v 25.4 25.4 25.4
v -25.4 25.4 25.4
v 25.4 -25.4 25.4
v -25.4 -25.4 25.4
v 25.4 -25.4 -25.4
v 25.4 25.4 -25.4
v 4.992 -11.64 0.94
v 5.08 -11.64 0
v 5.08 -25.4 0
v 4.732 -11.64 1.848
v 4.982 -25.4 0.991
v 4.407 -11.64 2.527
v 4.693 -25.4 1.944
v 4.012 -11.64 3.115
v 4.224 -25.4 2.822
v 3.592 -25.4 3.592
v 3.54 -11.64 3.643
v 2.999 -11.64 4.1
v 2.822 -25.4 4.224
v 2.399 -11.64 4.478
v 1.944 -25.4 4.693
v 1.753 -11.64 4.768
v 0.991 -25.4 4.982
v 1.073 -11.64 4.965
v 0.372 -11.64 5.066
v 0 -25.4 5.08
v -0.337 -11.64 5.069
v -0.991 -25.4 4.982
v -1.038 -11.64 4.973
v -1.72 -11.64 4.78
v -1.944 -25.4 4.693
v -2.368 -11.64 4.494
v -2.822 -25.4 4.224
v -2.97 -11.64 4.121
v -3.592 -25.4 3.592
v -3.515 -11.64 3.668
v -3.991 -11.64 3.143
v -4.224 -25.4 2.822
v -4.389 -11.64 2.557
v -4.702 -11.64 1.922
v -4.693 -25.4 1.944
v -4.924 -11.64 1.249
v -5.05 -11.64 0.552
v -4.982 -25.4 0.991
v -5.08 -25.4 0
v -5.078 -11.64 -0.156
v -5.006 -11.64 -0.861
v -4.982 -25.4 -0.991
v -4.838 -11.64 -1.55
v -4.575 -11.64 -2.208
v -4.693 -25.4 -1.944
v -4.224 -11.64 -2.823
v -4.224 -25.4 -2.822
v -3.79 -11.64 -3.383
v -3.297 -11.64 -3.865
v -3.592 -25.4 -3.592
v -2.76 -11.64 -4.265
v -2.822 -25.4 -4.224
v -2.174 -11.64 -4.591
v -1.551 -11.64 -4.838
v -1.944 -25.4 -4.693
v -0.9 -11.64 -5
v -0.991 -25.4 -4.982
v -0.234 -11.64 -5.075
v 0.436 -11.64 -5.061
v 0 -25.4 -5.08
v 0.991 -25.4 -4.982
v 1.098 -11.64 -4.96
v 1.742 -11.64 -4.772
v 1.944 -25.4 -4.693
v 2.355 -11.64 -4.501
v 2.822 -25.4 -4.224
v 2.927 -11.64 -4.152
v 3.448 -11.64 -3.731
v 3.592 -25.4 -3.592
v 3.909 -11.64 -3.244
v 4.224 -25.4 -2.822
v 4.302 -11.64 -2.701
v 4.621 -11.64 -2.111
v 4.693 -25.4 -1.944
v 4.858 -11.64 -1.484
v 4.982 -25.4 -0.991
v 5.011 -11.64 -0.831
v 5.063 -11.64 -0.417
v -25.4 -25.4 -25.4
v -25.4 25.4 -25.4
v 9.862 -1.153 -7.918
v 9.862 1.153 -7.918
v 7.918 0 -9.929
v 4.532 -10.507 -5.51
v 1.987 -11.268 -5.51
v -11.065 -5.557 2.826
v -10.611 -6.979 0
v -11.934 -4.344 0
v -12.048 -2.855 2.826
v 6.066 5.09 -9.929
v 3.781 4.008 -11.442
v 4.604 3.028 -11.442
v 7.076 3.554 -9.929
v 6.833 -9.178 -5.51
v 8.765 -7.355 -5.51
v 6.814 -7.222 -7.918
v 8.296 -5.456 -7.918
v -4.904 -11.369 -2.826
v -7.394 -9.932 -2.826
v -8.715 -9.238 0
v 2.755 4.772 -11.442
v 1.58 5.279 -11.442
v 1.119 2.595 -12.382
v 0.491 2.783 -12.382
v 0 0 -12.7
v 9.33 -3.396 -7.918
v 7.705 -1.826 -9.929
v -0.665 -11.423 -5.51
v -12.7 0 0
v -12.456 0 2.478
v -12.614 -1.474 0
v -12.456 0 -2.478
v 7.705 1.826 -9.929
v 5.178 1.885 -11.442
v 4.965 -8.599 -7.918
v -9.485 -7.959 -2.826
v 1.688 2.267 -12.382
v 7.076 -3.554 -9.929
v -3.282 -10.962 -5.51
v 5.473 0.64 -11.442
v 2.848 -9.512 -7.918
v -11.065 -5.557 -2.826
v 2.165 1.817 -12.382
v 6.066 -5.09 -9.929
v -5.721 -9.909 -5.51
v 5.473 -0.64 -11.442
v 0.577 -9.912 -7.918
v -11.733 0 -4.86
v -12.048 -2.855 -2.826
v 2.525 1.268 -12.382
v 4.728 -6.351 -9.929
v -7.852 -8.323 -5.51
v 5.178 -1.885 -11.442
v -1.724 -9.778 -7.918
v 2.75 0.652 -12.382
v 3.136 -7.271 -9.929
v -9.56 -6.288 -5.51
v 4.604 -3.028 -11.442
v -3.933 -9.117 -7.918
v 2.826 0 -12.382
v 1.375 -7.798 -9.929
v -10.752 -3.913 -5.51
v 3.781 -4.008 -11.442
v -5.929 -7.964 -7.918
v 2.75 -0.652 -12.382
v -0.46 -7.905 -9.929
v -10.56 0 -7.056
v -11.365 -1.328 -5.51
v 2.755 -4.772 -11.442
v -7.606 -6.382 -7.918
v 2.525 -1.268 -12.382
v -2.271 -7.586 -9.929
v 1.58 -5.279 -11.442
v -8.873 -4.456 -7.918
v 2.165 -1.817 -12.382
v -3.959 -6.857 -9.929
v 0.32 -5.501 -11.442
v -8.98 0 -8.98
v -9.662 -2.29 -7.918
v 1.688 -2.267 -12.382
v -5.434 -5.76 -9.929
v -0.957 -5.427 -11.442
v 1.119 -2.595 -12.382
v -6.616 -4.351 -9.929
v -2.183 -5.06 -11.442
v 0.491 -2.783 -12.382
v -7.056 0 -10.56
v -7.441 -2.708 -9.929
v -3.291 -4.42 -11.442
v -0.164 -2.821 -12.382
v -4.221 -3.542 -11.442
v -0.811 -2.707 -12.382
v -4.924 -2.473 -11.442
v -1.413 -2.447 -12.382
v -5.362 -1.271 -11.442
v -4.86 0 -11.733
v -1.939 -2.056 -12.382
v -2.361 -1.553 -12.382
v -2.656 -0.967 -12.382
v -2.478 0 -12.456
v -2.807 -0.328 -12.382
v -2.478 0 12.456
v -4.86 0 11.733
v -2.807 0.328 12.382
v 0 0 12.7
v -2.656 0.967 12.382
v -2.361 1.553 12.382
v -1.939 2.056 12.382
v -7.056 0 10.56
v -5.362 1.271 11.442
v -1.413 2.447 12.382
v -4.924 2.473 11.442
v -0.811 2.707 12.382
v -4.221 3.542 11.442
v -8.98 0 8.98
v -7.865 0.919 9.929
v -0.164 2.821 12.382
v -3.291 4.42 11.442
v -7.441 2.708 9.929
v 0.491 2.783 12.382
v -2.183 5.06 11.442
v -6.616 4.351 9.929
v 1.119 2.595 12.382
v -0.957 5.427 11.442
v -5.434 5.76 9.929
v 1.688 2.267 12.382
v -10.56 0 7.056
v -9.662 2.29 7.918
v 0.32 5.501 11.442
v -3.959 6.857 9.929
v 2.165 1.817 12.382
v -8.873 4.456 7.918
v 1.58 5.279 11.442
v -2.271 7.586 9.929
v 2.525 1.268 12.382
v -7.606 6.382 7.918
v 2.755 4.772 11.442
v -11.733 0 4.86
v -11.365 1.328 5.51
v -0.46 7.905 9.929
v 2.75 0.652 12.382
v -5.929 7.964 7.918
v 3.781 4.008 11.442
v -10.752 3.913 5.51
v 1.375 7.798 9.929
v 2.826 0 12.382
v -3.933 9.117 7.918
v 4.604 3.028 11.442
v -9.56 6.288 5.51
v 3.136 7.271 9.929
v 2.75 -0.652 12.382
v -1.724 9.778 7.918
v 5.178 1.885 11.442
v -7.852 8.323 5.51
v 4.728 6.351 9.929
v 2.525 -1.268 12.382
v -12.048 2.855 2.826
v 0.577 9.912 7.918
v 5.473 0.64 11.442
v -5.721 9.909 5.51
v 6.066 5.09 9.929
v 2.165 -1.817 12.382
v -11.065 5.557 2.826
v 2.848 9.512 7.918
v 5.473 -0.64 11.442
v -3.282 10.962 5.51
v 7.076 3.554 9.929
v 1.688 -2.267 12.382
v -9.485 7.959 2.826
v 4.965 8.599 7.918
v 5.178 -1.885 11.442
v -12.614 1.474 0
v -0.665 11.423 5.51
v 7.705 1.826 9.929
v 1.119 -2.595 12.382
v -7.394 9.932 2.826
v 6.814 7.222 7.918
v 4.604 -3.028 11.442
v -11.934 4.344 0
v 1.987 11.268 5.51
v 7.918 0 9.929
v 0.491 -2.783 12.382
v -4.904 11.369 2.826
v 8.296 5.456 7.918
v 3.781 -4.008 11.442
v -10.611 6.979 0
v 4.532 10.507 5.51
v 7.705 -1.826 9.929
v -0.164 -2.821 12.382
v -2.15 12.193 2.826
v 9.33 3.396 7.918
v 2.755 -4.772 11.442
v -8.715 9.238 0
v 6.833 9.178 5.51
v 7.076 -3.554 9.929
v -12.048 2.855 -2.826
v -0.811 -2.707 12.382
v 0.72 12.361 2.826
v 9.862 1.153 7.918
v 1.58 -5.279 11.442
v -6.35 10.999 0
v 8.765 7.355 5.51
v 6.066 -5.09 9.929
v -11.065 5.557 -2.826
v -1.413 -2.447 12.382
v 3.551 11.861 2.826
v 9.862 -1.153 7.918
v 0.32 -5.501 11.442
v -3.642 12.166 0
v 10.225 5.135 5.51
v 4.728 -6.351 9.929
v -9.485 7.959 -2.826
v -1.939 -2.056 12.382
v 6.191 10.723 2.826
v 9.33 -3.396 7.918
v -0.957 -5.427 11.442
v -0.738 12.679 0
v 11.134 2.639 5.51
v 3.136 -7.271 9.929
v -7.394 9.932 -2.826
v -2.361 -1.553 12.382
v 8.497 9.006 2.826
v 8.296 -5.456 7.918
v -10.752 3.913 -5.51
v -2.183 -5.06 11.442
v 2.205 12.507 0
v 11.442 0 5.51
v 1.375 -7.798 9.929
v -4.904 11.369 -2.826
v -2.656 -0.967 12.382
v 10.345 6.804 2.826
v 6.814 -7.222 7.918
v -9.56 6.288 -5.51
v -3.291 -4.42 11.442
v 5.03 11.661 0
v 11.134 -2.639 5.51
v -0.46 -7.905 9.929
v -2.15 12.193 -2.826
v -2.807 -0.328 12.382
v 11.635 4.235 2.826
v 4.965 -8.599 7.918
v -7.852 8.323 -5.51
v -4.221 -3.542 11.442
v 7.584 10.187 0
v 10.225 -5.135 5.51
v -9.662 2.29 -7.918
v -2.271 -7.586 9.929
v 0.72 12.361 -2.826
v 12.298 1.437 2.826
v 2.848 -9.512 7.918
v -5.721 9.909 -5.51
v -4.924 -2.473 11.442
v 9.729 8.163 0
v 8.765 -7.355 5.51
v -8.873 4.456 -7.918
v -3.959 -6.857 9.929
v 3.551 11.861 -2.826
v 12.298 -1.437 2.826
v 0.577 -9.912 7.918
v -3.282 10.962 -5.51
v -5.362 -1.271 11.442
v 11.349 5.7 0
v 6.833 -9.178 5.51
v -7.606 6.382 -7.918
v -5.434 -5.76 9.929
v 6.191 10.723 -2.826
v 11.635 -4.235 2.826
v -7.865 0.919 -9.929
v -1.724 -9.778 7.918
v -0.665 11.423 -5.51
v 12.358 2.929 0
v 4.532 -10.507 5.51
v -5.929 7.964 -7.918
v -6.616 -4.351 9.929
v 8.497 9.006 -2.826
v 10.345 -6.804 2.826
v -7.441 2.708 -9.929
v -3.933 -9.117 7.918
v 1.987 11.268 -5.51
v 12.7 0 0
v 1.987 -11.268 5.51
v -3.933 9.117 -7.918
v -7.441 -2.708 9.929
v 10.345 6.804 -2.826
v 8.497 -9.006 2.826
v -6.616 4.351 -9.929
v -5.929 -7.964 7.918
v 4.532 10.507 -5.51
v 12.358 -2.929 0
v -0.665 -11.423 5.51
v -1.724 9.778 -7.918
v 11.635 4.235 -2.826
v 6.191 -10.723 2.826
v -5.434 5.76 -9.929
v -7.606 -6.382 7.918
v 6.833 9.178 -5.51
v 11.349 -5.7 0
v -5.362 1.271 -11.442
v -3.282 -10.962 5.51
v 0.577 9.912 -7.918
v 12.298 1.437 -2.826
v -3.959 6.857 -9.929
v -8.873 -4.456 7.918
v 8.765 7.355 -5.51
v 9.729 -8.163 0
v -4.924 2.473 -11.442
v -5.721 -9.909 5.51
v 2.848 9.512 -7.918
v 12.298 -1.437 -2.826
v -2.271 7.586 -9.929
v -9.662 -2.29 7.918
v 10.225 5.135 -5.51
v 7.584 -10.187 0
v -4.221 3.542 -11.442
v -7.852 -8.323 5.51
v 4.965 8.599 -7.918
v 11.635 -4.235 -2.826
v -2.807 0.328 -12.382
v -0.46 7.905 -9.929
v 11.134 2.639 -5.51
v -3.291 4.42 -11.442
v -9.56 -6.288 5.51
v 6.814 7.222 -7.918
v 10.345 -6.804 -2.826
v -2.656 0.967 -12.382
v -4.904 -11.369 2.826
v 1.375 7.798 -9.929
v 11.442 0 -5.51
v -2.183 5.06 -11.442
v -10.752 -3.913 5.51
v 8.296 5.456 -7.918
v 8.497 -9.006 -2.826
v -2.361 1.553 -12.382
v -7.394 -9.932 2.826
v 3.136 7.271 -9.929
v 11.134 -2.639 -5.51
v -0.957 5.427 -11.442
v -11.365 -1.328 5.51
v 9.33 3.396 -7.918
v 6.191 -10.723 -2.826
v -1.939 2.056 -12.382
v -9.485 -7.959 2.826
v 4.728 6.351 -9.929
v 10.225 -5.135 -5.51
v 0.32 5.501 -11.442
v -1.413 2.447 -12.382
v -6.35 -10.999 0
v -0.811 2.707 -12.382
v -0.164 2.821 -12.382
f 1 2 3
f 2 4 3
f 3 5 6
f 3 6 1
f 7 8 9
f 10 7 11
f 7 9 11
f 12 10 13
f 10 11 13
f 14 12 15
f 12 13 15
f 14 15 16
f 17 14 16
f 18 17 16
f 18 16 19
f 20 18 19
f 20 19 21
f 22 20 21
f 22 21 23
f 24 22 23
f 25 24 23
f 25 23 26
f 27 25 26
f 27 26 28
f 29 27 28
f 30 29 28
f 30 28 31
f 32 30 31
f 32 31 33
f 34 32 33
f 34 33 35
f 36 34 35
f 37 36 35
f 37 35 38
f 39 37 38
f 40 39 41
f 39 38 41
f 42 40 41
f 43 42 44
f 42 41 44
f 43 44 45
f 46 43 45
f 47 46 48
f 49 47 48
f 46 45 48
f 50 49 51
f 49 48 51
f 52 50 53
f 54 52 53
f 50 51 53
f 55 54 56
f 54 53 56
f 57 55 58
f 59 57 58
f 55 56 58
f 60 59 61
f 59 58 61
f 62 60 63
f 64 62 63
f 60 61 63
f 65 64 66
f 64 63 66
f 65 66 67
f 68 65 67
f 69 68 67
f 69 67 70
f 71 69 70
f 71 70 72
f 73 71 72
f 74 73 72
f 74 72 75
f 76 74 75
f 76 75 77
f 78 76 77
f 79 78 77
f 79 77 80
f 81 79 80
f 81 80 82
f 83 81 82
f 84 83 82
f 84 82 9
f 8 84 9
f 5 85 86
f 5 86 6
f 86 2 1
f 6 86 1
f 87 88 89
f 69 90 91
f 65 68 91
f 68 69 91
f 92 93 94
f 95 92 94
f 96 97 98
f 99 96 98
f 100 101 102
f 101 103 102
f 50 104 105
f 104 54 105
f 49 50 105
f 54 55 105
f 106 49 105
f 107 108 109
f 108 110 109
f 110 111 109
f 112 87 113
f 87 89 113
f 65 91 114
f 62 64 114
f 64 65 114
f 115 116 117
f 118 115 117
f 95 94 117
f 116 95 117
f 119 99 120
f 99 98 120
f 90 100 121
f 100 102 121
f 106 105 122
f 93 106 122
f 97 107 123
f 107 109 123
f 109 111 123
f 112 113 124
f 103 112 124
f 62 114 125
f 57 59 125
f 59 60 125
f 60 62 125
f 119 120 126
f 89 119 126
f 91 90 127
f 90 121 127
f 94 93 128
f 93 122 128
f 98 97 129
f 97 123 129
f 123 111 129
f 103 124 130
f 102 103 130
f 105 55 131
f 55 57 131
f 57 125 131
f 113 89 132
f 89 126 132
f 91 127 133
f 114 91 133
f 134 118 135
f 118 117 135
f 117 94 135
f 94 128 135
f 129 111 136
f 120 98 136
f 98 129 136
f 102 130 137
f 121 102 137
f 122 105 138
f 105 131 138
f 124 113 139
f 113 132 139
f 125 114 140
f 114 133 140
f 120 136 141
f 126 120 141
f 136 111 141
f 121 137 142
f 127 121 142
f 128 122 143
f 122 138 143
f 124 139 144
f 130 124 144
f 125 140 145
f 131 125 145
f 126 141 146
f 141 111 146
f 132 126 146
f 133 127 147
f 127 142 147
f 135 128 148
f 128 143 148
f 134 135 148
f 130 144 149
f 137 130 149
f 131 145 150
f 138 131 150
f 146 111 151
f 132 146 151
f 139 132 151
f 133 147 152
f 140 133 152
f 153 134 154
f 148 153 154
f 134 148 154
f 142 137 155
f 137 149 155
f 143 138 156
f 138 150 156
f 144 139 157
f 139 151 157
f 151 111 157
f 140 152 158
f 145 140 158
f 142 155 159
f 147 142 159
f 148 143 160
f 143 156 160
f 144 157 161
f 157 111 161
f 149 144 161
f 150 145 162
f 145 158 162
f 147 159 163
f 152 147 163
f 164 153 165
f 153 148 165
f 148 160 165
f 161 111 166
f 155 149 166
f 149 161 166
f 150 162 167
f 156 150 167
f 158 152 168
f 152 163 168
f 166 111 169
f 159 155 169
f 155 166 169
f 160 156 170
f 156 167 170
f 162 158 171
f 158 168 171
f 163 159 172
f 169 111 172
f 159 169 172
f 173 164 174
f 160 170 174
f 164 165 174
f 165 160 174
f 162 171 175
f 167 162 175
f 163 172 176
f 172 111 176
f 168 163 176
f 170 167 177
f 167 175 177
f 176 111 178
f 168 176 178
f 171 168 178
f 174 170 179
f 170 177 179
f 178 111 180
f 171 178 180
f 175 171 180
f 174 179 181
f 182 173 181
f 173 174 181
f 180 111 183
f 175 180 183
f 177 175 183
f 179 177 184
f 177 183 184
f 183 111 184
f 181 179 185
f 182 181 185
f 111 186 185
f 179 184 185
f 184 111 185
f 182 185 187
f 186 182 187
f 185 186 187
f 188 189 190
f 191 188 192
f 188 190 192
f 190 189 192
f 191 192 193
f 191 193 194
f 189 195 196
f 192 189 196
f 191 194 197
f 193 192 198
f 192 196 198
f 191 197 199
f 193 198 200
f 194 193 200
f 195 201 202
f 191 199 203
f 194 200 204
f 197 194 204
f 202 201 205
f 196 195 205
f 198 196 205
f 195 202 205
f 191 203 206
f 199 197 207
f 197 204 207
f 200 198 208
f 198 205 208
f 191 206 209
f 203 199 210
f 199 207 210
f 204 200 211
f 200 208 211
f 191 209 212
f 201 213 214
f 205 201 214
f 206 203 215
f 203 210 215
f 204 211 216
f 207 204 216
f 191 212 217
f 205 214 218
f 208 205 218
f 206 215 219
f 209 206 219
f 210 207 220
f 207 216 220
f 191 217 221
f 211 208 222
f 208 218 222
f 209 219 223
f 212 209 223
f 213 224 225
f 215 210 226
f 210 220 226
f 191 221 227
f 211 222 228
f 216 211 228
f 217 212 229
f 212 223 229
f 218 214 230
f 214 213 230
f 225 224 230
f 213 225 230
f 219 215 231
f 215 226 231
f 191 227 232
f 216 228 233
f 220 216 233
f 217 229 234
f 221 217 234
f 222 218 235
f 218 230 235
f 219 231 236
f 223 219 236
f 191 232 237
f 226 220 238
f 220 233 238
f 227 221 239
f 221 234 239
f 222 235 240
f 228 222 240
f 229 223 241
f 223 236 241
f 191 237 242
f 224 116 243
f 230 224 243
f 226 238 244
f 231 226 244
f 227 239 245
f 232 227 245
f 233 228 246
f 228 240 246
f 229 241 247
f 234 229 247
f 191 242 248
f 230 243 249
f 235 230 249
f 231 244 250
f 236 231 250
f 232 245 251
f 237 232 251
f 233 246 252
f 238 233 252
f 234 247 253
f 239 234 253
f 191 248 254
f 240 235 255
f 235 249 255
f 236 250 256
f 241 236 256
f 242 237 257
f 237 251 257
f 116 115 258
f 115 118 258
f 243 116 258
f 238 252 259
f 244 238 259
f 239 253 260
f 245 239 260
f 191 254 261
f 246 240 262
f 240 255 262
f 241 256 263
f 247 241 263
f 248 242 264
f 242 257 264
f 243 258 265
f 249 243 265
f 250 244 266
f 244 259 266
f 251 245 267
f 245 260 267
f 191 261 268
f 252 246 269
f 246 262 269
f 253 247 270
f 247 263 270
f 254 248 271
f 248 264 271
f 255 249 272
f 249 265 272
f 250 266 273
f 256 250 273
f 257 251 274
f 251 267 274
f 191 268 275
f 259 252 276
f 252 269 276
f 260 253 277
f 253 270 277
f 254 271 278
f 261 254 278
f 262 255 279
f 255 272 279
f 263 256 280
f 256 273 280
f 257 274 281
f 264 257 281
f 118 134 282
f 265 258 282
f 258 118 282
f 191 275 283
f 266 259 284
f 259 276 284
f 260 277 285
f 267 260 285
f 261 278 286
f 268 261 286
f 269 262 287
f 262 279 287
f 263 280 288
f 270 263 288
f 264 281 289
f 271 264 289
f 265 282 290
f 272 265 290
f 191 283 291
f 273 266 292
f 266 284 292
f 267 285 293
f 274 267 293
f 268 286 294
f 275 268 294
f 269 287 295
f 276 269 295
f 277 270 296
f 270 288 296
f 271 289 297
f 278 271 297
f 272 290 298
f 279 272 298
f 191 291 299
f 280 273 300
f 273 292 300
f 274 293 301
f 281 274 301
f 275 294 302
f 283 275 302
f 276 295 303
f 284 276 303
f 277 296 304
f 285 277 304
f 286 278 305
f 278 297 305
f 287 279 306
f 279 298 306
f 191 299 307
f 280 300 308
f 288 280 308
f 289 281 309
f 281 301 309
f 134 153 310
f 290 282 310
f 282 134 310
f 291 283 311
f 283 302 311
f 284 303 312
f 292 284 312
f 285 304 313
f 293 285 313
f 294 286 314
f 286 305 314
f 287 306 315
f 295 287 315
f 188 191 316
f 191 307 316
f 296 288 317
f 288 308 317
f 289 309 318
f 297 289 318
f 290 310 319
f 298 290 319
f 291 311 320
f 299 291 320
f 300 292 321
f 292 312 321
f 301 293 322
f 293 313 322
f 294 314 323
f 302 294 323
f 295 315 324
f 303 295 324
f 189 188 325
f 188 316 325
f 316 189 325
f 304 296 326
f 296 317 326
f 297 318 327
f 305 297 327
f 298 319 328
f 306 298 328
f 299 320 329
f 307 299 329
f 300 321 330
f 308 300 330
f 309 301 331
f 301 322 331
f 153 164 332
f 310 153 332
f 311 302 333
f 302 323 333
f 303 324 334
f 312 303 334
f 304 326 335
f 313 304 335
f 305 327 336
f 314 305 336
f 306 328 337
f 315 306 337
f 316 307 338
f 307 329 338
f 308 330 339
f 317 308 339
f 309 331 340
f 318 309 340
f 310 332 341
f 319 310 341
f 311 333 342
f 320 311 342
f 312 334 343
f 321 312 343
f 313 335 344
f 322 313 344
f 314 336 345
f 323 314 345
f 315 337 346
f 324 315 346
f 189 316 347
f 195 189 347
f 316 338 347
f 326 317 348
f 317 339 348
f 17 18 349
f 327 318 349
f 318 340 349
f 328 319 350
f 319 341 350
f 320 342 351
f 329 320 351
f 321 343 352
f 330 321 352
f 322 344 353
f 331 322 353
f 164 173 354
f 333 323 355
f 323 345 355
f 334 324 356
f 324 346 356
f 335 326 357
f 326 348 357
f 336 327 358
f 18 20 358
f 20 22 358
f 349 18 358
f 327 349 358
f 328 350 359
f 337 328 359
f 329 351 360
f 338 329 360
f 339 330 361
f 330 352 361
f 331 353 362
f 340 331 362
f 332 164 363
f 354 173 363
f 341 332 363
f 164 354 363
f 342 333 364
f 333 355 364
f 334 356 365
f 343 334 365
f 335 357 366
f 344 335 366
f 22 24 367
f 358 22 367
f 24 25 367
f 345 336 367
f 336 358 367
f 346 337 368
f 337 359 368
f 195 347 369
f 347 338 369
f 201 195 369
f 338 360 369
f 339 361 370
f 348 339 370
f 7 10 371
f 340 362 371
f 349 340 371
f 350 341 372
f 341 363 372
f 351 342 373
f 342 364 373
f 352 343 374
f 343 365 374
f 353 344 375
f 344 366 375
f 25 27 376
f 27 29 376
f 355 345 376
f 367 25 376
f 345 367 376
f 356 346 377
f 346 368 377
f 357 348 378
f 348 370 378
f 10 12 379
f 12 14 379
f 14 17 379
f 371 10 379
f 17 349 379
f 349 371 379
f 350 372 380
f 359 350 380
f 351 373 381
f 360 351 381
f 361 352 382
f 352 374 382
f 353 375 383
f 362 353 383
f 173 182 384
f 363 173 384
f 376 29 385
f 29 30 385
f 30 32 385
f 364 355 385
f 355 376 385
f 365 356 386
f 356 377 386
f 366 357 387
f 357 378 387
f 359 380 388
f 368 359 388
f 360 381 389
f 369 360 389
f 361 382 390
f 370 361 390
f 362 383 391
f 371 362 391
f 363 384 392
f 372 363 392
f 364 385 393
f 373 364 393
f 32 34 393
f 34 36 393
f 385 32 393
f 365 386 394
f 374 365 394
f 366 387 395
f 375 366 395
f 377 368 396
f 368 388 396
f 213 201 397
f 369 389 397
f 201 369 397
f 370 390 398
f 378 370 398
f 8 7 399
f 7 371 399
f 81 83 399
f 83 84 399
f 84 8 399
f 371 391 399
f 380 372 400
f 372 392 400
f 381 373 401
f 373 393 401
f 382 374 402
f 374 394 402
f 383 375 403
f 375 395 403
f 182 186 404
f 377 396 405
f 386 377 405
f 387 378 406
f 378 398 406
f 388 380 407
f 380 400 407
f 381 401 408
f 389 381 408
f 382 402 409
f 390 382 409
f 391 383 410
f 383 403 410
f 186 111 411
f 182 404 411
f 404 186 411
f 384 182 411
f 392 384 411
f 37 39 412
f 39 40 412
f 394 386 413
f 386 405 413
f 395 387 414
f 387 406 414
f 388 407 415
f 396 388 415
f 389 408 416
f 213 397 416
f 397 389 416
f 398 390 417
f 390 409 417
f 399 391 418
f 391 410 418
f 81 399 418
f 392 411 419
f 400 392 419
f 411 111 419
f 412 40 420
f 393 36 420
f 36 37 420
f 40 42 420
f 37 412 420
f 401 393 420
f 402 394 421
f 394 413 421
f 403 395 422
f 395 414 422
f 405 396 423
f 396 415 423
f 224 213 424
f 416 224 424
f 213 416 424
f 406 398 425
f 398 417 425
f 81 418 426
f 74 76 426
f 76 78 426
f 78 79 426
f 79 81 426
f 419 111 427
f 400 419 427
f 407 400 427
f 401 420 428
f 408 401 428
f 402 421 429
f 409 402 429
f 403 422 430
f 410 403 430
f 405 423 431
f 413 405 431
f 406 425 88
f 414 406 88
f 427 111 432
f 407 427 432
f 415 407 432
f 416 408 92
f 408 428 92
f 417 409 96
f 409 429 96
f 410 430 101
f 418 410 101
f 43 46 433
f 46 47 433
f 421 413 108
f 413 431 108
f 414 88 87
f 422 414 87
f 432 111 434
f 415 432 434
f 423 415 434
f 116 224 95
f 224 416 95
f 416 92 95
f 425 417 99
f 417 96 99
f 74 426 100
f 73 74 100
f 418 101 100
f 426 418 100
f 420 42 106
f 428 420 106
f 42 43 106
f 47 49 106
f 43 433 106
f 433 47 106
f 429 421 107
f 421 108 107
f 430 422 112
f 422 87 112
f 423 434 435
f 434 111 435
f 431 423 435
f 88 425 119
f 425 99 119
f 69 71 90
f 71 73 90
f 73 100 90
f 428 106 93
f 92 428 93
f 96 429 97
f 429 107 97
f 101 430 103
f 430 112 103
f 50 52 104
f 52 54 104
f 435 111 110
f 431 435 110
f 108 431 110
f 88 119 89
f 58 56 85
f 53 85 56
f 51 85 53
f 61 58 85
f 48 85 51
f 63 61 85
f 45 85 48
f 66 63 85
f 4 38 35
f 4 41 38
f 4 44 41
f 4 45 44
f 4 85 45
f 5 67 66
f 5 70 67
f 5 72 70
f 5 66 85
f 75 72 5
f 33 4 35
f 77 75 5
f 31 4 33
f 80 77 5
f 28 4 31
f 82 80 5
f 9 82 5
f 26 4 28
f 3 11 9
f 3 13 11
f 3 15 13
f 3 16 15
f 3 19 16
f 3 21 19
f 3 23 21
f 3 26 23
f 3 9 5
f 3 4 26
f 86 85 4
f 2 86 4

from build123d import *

# Parameters (mm, degrees)
F0_W     = 50.8
F0_H     = 50.8
F1_DEPTH = 25.4
F4_R     = 5.08
F5_DEPTH = 25.4


with BuildPart() as f1:
    # F0 (on Front) → F1 (new body, symmetric)
    with BuildSketch(Plane.XZ):
        Rectangle(F0_W, F0_H)
    extrude(amount=F1_DEPTH, both=True)

    # F2 (on Front) → F3 (revolve, cut)
    with BuildSketch(Plane.XZ):
        with BuildLine():
            Line((0, -12.7), (0, 12.7))
            ThreePointArc((0, 12.7), (-12.7, 0), (0, -12.7))
        make_face()
    revolve(axis=Axis((0, 0, 0), (0, 0, -1)), mode=Mode.SUBTRACT)

    # F4 (on face) → F5 (cut)
    with BuildSketch(Plane.XZ.offset(25.4)):
        Circle(F4_R)
    extrude(amount=-F5_DEPTH, mode=Mode.SUBTRACT)


solid = f1.part
